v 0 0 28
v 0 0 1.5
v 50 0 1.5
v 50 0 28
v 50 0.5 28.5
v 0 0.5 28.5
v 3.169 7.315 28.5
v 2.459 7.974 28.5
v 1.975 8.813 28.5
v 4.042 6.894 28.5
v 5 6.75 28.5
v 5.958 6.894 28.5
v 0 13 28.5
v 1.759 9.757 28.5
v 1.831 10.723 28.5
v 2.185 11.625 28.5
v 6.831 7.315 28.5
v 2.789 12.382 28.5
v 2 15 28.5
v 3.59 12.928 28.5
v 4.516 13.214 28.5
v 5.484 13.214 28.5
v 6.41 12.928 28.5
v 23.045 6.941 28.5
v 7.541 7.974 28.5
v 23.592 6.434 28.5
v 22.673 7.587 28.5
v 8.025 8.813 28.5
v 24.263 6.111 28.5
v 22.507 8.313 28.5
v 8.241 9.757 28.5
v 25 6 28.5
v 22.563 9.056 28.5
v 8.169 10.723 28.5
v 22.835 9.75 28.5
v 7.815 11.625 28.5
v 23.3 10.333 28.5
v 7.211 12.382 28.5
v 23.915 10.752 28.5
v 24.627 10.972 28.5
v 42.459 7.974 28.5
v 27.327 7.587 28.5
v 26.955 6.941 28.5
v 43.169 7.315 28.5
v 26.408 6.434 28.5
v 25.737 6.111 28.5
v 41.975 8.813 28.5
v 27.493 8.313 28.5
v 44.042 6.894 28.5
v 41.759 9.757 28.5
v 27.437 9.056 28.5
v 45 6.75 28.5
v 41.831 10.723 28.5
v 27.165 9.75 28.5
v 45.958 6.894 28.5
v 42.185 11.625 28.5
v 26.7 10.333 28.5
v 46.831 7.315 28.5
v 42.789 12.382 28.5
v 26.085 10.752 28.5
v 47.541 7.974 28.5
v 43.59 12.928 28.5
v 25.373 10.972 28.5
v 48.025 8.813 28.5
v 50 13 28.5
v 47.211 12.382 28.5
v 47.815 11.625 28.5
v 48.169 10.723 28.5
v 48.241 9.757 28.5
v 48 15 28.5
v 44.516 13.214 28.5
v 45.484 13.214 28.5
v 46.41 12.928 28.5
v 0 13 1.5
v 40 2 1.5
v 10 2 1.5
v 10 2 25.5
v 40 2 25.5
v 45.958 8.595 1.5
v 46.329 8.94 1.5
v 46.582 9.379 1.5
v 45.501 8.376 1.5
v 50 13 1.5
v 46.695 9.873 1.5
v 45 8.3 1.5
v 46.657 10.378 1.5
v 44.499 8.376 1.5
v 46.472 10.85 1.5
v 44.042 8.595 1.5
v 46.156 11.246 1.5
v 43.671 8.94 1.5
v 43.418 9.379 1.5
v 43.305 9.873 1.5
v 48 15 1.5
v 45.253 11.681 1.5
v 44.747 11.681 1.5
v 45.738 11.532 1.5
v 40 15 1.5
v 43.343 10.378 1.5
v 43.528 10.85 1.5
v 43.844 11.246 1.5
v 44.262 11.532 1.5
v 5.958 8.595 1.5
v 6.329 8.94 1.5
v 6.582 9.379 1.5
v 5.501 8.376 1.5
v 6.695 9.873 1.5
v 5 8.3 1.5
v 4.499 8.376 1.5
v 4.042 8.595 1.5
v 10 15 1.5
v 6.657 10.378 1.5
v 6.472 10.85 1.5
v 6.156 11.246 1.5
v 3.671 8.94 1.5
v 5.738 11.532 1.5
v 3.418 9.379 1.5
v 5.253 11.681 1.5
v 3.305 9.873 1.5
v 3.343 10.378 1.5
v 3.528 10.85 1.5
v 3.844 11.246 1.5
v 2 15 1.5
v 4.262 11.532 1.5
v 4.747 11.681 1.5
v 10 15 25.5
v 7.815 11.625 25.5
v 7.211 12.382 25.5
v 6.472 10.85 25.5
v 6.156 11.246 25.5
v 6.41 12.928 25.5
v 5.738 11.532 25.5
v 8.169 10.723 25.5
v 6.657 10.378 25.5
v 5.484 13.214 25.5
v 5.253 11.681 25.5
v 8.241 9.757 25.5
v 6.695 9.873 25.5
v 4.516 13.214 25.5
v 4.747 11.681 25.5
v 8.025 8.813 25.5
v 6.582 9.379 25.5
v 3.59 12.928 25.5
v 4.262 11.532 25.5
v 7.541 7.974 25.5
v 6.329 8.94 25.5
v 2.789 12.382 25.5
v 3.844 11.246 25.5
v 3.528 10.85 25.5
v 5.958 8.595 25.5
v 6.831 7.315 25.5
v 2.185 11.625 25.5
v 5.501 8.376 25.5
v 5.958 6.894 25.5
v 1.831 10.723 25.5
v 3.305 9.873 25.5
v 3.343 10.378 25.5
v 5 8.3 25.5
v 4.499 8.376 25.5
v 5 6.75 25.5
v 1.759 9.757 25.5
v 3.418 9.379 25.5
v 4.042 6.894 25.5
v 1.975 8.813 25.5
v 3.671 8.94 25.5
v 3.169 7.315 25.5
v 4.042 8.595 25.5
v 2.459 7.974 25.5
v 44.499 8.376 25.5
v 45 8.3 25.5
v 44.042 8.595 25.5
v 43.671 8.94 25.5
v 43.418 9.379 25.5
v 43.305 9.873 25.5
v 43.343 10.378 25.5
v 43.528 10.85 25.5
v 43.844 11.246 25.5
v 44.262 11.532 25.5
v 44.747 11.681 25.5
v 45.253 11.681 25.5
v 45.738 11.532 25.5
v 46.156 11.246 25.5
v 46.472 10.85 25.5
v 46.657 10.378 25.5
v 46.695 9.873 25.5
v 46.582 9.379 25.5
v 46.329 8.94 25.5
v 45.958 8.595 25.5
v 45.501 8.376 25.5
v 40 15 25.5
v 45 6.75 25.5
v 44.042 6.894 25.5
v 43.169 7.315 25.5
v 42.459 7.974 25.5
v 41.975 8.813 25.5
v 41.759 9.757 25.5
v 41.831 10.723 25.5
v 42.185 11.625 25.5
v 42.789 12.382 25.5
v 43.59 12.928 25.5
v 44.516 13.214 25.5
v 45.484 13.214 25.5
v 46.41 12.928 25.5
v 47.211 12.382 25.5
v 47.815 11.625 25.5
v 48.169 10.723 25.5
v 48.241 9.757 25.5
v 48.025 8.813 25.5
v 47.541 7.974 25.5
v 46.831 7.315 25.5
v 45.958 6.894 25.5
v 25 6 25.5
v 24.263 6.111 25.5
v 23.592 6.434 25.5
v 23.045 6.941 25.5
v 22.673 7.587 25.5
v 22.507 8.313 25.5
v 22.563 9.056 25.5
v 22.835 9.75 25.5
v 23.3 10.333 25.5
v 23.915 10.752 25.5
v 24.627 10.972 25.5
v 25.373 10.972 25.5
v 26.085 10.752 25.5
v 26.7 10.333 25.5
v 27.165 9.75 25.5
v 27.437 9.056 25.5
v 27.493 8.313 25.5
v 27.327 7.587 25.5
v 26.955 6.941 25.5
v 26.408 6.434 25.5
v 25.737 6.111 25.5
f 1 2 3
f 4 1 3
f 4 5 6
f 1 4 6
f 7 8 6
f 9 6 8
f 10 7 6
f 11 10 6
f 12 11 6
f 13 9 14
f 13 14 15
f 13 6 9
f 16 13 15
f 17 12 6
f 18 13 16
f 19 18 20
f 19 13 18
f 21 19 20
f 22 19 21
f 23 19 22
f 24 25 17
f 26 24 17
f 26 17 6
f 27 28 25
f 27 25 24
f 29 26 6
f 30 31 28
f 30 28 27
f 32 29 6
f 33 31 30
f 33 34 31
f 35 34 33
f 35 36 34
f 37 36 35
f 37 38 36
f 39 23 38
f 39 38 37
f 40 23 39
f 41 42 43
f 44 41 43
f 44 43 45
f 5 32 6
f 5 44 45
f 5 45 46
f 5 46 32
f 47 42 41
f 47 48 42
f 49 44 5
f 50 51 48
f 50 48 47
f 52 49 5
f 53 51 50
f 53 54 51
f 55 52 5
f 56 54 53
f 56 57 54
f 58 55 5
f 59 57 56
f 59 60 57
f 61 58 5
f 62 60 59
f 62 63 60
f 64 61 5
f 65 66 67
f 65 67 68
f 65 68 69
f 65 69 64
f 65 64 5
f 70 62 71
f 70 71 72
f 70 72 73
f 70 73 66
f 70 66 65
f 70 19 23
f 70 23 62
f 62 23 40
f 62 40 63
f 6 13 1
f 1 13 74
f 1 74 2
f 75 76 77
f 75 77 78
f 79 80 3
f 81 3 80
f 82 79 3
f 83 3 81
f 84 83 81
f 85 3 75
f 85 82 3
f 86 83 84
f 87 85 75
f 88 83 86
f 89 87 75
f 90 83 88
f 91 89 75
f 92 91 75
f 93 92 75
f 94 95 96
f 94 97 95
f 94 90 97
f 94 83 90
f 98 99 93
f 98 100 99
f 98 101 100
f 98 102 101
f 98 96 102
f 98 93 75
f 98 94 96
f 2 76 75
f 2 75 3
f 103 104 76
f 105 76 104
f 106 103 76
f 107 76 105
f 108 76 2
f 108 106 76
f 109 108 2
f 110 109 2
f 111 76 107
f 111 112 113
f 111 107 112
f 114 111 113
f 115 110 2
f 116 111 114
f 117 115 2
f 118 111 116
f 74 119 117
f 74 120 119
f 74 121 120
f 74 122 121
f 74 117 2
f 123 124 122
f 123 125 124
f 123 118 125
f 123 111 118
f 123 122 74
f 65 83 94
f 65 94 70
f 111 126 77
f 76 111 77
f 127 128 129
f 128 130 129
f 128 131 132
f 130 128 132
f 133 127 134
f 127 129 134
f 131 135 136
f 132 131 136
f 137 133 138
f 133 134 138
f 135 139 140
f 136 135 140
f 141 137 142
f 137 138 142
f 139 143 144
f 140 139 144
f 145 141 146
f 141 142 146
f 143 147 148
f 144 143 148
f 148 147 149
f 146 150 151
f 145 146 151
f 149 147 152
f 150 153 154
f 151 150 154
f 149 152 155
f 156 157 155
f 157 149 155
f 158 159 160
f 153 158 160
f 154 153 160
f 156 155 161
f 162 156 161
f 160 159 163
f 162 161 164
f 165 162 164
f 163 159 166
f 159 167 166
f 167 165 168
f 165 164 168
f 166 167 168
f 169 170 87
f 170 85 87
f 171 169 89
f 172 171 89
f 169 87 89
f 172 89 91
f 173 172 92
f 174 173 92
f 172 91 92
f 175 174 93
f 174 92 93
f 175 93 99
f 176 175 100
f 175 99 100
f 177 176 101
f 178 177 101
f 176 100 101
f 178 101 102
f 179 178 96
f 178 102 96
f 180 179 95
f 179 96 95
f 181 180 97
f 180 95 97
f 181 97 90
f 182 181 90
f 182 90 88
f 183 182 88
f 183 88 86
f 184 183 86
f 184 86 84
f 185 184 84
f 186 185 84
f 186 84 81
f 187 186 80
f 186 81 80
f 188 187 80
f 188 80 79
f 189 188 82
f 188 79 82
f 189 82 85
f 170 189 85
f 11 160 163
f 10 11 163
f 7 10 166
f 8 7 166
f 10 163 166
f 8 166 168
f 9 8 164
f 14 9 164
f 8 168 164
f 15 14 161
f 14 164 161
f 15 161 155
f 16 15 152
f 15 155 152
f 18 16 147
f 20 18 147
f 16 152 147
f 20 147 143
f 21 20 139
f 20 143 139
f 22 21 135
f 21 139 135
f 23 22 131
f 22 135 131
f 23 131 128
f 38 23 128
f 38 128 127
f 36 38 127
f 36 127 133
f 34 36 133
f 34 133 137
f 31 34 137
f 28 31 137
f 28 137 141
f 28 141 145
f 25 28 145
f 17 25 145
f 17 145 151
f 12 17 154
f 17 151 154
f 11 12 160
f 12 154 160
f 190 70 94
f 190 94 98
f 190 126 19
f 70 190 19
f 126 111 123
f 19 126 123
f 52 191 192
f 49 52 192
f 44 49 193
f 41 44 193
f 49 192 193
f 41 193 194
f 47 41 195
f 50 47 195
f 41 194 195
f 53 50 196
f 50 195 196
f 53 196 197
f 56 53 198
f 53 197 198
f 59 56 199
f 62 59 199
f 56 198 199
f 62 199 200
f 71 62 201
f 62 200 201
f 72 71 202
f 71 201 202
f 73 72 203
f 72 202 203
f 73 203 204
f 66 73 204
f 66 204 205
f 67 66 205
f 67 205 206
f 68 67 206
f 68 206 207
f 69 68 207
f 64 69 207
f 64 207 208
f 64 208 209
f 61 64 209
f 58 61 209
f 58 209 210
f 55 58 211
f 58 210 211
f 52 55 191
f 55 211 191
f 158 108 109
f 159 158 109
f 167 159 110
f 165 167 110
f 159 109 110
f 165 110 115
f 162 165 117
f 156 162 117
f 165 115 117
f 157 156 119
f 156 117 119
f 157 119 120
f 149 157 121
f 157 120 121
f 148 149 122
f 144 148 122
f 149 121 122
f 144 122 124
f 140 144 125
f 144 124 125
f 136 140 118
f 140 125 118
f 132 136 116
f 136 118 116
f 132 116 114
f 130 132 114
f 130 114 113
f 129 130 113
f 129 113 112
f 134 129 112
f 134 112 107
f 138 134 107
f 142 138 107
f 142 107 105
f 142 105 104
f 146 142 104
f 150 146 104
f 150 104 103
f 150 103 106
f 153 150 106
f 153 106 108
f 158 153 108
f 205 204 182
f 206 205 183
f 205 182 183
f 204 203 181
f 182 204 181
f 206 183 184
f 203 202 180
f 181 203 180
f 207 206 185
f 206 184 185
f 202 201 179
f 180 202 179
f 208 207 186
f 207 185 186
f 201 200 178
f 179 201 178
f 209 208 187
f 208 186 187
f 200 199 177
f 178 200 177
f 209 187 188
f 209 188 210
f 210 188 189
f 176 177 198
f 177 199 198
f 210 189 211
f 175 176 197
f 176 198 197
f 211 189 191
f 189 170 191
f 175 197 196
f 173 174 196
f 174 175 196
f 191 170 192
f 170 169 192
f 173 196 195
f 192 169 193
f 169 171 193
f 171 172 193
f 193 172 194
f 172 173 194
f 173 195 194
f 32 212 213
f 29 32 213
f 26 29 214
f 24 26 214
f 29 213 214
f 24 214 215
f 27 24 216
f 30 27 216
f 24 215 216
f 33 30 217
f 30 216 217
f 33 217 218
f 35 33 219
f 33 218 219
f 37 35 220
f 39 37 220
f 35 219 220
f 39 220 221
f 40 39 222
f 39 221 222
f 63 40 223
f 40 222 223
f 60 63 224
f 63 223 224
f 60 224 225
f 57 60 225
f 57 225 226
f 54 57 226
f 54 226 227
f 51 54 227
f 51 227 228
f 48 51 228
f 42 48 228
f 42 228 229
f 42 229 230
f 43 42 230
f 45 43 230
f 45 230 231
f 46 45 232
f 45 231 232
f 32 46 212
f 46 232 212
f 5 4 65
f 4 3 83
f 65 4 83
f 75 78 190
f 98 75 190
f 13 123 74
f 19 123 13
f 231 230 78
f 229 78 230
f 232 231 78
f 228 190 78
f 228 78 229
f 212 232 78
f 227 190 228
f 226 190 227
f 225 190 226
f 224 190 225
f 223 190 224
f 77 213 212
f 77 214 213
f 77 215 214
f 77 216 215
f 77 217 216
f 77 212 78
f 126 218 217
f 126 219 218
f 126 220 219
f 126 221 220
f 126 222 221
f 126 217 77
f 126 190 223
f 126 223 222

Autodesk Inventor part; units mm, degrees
ref_plane "YZ Plane" through (0, 0, 0) normal (1, 0, 0) x (0, 1, 0)
ref_plane "XZ Plane" through (0, 0, 0) normal (0, 1, 0) x (-1, 0, 0)
ref_plane "XY Plane" through (0, 0, 0) normal (0, 0, 1) x (1, 0, 0)
sketch "Skizze1" plane through (0, 0, 0) normal (0, 0, 1) x (1, 0, 0)
  line L0 (0, 0) -> (50, 0)
  line L1 (50, 0) -> (50, 15)
  line L2 (50, 15) -> (0, 15)
  line L3 (0, 15) -> (0, 0)
  dimension "d0" = 15
  dimension "d1" = 50
extrude "Extrusion1" add sketch "Skizze1" along normal blind 28.5
hole "Bohrung1" at (45, 10, 28.5) direction (0, 0, -1) diameter 3.4 end through all counterbore diameter 6.5 counterbore depth 3 clearance for "Inbusschraube DIN EN ISO 4762" size "M3" standard "DIN"
hole "Bohrung2" at (5, 10, 28.5) direction (0, 0, -1) diameter 3.4 end through all counterbore diameter 6.5 counterbore depth 3 clearance for "Inbusschraube DIN EN ISO 4762" size "M3" standard "DIN"
chamfer "Fase1" distance 0.5 angle 45 1 edges at (25, 0, 28.5)
sketch "Skizze2" plane through (0, 0, 0) normal (0, 0, -1) x (-1, 0, 0)
  line L0 (0, 15) -> (0, 0) projected
  line L1 (-50, 15) -> (0, 15) projected
  line L2 (-50, 0) -> (-50, 15) projected
  line L3 (-40, 15) -> (-10, 15)
  line L4 (-10, 15) -> (-10, 2)
  line L5 (-10, 2) -> (-40, 2)
  line L6 (-40, 2) -> (-40, 15)
  line L7 (0, 0) -> (-50, 0) projected
  dimension "d25" = 10
  dimension "d26" = 10
  dimension "d44" = 2
extrude "Extrusion2" cut sketch "Skizze2" against normal blind 25.5 contours L4 L5 L6 L1
hole "Bohrung3" at (25, 8.5, 28.5) direction (0, 0, -1) diameter 5 end through all
chamfer "Fase2" distance 2 angle 45 2 edges at (50, 15, 14.25) (0, 15, 14.25)
sketch "Skizze4" plane through (0, 0, 0) normal (0, 0, -1) x (-1, 0, 0)
  line L0 (-50, 0) -> (-50, 13)
  line L1 (-50, 0) -> (-50, 13) projected
  line L2 (-50, 13) -> (-48, 15)
  line L3 (-48, 15) -> (-50, 13) projected
  line L4 (-48, 15) -> (-40, 15)
  line L5 (-48, 15) -> (-40, 15) projected
  line L6 (-40, 15) -> (-40, 3)
  line L7 (-40, 2) -> (-40, 15) projected
  line L8 (-40, 2) -> (-10, 2)
  line L9 (-10, 2) -> (-40, 2) projected
  line L10 (-10, 2) -> (-10, 15)
  line L11 (-10, 15) -> (-10, 2) projected
  line L12 (-10, 15) -> (-2, 15)
  line L13 (-2, 15) -> (0, 13)
  line L14 (0, 13) -> (-2, 15) projected
  line L15 (0, 13) -> (0, 0)
  line L16 (0, 0) -> (-50, 0)
  line L17 (0, 0) -> (-50, 0) projected
extrude "Extrusion4" cut sketch "Skizze4" against normal blind 1.5
properties part number "Peripherie2_Motor2_liegend"
